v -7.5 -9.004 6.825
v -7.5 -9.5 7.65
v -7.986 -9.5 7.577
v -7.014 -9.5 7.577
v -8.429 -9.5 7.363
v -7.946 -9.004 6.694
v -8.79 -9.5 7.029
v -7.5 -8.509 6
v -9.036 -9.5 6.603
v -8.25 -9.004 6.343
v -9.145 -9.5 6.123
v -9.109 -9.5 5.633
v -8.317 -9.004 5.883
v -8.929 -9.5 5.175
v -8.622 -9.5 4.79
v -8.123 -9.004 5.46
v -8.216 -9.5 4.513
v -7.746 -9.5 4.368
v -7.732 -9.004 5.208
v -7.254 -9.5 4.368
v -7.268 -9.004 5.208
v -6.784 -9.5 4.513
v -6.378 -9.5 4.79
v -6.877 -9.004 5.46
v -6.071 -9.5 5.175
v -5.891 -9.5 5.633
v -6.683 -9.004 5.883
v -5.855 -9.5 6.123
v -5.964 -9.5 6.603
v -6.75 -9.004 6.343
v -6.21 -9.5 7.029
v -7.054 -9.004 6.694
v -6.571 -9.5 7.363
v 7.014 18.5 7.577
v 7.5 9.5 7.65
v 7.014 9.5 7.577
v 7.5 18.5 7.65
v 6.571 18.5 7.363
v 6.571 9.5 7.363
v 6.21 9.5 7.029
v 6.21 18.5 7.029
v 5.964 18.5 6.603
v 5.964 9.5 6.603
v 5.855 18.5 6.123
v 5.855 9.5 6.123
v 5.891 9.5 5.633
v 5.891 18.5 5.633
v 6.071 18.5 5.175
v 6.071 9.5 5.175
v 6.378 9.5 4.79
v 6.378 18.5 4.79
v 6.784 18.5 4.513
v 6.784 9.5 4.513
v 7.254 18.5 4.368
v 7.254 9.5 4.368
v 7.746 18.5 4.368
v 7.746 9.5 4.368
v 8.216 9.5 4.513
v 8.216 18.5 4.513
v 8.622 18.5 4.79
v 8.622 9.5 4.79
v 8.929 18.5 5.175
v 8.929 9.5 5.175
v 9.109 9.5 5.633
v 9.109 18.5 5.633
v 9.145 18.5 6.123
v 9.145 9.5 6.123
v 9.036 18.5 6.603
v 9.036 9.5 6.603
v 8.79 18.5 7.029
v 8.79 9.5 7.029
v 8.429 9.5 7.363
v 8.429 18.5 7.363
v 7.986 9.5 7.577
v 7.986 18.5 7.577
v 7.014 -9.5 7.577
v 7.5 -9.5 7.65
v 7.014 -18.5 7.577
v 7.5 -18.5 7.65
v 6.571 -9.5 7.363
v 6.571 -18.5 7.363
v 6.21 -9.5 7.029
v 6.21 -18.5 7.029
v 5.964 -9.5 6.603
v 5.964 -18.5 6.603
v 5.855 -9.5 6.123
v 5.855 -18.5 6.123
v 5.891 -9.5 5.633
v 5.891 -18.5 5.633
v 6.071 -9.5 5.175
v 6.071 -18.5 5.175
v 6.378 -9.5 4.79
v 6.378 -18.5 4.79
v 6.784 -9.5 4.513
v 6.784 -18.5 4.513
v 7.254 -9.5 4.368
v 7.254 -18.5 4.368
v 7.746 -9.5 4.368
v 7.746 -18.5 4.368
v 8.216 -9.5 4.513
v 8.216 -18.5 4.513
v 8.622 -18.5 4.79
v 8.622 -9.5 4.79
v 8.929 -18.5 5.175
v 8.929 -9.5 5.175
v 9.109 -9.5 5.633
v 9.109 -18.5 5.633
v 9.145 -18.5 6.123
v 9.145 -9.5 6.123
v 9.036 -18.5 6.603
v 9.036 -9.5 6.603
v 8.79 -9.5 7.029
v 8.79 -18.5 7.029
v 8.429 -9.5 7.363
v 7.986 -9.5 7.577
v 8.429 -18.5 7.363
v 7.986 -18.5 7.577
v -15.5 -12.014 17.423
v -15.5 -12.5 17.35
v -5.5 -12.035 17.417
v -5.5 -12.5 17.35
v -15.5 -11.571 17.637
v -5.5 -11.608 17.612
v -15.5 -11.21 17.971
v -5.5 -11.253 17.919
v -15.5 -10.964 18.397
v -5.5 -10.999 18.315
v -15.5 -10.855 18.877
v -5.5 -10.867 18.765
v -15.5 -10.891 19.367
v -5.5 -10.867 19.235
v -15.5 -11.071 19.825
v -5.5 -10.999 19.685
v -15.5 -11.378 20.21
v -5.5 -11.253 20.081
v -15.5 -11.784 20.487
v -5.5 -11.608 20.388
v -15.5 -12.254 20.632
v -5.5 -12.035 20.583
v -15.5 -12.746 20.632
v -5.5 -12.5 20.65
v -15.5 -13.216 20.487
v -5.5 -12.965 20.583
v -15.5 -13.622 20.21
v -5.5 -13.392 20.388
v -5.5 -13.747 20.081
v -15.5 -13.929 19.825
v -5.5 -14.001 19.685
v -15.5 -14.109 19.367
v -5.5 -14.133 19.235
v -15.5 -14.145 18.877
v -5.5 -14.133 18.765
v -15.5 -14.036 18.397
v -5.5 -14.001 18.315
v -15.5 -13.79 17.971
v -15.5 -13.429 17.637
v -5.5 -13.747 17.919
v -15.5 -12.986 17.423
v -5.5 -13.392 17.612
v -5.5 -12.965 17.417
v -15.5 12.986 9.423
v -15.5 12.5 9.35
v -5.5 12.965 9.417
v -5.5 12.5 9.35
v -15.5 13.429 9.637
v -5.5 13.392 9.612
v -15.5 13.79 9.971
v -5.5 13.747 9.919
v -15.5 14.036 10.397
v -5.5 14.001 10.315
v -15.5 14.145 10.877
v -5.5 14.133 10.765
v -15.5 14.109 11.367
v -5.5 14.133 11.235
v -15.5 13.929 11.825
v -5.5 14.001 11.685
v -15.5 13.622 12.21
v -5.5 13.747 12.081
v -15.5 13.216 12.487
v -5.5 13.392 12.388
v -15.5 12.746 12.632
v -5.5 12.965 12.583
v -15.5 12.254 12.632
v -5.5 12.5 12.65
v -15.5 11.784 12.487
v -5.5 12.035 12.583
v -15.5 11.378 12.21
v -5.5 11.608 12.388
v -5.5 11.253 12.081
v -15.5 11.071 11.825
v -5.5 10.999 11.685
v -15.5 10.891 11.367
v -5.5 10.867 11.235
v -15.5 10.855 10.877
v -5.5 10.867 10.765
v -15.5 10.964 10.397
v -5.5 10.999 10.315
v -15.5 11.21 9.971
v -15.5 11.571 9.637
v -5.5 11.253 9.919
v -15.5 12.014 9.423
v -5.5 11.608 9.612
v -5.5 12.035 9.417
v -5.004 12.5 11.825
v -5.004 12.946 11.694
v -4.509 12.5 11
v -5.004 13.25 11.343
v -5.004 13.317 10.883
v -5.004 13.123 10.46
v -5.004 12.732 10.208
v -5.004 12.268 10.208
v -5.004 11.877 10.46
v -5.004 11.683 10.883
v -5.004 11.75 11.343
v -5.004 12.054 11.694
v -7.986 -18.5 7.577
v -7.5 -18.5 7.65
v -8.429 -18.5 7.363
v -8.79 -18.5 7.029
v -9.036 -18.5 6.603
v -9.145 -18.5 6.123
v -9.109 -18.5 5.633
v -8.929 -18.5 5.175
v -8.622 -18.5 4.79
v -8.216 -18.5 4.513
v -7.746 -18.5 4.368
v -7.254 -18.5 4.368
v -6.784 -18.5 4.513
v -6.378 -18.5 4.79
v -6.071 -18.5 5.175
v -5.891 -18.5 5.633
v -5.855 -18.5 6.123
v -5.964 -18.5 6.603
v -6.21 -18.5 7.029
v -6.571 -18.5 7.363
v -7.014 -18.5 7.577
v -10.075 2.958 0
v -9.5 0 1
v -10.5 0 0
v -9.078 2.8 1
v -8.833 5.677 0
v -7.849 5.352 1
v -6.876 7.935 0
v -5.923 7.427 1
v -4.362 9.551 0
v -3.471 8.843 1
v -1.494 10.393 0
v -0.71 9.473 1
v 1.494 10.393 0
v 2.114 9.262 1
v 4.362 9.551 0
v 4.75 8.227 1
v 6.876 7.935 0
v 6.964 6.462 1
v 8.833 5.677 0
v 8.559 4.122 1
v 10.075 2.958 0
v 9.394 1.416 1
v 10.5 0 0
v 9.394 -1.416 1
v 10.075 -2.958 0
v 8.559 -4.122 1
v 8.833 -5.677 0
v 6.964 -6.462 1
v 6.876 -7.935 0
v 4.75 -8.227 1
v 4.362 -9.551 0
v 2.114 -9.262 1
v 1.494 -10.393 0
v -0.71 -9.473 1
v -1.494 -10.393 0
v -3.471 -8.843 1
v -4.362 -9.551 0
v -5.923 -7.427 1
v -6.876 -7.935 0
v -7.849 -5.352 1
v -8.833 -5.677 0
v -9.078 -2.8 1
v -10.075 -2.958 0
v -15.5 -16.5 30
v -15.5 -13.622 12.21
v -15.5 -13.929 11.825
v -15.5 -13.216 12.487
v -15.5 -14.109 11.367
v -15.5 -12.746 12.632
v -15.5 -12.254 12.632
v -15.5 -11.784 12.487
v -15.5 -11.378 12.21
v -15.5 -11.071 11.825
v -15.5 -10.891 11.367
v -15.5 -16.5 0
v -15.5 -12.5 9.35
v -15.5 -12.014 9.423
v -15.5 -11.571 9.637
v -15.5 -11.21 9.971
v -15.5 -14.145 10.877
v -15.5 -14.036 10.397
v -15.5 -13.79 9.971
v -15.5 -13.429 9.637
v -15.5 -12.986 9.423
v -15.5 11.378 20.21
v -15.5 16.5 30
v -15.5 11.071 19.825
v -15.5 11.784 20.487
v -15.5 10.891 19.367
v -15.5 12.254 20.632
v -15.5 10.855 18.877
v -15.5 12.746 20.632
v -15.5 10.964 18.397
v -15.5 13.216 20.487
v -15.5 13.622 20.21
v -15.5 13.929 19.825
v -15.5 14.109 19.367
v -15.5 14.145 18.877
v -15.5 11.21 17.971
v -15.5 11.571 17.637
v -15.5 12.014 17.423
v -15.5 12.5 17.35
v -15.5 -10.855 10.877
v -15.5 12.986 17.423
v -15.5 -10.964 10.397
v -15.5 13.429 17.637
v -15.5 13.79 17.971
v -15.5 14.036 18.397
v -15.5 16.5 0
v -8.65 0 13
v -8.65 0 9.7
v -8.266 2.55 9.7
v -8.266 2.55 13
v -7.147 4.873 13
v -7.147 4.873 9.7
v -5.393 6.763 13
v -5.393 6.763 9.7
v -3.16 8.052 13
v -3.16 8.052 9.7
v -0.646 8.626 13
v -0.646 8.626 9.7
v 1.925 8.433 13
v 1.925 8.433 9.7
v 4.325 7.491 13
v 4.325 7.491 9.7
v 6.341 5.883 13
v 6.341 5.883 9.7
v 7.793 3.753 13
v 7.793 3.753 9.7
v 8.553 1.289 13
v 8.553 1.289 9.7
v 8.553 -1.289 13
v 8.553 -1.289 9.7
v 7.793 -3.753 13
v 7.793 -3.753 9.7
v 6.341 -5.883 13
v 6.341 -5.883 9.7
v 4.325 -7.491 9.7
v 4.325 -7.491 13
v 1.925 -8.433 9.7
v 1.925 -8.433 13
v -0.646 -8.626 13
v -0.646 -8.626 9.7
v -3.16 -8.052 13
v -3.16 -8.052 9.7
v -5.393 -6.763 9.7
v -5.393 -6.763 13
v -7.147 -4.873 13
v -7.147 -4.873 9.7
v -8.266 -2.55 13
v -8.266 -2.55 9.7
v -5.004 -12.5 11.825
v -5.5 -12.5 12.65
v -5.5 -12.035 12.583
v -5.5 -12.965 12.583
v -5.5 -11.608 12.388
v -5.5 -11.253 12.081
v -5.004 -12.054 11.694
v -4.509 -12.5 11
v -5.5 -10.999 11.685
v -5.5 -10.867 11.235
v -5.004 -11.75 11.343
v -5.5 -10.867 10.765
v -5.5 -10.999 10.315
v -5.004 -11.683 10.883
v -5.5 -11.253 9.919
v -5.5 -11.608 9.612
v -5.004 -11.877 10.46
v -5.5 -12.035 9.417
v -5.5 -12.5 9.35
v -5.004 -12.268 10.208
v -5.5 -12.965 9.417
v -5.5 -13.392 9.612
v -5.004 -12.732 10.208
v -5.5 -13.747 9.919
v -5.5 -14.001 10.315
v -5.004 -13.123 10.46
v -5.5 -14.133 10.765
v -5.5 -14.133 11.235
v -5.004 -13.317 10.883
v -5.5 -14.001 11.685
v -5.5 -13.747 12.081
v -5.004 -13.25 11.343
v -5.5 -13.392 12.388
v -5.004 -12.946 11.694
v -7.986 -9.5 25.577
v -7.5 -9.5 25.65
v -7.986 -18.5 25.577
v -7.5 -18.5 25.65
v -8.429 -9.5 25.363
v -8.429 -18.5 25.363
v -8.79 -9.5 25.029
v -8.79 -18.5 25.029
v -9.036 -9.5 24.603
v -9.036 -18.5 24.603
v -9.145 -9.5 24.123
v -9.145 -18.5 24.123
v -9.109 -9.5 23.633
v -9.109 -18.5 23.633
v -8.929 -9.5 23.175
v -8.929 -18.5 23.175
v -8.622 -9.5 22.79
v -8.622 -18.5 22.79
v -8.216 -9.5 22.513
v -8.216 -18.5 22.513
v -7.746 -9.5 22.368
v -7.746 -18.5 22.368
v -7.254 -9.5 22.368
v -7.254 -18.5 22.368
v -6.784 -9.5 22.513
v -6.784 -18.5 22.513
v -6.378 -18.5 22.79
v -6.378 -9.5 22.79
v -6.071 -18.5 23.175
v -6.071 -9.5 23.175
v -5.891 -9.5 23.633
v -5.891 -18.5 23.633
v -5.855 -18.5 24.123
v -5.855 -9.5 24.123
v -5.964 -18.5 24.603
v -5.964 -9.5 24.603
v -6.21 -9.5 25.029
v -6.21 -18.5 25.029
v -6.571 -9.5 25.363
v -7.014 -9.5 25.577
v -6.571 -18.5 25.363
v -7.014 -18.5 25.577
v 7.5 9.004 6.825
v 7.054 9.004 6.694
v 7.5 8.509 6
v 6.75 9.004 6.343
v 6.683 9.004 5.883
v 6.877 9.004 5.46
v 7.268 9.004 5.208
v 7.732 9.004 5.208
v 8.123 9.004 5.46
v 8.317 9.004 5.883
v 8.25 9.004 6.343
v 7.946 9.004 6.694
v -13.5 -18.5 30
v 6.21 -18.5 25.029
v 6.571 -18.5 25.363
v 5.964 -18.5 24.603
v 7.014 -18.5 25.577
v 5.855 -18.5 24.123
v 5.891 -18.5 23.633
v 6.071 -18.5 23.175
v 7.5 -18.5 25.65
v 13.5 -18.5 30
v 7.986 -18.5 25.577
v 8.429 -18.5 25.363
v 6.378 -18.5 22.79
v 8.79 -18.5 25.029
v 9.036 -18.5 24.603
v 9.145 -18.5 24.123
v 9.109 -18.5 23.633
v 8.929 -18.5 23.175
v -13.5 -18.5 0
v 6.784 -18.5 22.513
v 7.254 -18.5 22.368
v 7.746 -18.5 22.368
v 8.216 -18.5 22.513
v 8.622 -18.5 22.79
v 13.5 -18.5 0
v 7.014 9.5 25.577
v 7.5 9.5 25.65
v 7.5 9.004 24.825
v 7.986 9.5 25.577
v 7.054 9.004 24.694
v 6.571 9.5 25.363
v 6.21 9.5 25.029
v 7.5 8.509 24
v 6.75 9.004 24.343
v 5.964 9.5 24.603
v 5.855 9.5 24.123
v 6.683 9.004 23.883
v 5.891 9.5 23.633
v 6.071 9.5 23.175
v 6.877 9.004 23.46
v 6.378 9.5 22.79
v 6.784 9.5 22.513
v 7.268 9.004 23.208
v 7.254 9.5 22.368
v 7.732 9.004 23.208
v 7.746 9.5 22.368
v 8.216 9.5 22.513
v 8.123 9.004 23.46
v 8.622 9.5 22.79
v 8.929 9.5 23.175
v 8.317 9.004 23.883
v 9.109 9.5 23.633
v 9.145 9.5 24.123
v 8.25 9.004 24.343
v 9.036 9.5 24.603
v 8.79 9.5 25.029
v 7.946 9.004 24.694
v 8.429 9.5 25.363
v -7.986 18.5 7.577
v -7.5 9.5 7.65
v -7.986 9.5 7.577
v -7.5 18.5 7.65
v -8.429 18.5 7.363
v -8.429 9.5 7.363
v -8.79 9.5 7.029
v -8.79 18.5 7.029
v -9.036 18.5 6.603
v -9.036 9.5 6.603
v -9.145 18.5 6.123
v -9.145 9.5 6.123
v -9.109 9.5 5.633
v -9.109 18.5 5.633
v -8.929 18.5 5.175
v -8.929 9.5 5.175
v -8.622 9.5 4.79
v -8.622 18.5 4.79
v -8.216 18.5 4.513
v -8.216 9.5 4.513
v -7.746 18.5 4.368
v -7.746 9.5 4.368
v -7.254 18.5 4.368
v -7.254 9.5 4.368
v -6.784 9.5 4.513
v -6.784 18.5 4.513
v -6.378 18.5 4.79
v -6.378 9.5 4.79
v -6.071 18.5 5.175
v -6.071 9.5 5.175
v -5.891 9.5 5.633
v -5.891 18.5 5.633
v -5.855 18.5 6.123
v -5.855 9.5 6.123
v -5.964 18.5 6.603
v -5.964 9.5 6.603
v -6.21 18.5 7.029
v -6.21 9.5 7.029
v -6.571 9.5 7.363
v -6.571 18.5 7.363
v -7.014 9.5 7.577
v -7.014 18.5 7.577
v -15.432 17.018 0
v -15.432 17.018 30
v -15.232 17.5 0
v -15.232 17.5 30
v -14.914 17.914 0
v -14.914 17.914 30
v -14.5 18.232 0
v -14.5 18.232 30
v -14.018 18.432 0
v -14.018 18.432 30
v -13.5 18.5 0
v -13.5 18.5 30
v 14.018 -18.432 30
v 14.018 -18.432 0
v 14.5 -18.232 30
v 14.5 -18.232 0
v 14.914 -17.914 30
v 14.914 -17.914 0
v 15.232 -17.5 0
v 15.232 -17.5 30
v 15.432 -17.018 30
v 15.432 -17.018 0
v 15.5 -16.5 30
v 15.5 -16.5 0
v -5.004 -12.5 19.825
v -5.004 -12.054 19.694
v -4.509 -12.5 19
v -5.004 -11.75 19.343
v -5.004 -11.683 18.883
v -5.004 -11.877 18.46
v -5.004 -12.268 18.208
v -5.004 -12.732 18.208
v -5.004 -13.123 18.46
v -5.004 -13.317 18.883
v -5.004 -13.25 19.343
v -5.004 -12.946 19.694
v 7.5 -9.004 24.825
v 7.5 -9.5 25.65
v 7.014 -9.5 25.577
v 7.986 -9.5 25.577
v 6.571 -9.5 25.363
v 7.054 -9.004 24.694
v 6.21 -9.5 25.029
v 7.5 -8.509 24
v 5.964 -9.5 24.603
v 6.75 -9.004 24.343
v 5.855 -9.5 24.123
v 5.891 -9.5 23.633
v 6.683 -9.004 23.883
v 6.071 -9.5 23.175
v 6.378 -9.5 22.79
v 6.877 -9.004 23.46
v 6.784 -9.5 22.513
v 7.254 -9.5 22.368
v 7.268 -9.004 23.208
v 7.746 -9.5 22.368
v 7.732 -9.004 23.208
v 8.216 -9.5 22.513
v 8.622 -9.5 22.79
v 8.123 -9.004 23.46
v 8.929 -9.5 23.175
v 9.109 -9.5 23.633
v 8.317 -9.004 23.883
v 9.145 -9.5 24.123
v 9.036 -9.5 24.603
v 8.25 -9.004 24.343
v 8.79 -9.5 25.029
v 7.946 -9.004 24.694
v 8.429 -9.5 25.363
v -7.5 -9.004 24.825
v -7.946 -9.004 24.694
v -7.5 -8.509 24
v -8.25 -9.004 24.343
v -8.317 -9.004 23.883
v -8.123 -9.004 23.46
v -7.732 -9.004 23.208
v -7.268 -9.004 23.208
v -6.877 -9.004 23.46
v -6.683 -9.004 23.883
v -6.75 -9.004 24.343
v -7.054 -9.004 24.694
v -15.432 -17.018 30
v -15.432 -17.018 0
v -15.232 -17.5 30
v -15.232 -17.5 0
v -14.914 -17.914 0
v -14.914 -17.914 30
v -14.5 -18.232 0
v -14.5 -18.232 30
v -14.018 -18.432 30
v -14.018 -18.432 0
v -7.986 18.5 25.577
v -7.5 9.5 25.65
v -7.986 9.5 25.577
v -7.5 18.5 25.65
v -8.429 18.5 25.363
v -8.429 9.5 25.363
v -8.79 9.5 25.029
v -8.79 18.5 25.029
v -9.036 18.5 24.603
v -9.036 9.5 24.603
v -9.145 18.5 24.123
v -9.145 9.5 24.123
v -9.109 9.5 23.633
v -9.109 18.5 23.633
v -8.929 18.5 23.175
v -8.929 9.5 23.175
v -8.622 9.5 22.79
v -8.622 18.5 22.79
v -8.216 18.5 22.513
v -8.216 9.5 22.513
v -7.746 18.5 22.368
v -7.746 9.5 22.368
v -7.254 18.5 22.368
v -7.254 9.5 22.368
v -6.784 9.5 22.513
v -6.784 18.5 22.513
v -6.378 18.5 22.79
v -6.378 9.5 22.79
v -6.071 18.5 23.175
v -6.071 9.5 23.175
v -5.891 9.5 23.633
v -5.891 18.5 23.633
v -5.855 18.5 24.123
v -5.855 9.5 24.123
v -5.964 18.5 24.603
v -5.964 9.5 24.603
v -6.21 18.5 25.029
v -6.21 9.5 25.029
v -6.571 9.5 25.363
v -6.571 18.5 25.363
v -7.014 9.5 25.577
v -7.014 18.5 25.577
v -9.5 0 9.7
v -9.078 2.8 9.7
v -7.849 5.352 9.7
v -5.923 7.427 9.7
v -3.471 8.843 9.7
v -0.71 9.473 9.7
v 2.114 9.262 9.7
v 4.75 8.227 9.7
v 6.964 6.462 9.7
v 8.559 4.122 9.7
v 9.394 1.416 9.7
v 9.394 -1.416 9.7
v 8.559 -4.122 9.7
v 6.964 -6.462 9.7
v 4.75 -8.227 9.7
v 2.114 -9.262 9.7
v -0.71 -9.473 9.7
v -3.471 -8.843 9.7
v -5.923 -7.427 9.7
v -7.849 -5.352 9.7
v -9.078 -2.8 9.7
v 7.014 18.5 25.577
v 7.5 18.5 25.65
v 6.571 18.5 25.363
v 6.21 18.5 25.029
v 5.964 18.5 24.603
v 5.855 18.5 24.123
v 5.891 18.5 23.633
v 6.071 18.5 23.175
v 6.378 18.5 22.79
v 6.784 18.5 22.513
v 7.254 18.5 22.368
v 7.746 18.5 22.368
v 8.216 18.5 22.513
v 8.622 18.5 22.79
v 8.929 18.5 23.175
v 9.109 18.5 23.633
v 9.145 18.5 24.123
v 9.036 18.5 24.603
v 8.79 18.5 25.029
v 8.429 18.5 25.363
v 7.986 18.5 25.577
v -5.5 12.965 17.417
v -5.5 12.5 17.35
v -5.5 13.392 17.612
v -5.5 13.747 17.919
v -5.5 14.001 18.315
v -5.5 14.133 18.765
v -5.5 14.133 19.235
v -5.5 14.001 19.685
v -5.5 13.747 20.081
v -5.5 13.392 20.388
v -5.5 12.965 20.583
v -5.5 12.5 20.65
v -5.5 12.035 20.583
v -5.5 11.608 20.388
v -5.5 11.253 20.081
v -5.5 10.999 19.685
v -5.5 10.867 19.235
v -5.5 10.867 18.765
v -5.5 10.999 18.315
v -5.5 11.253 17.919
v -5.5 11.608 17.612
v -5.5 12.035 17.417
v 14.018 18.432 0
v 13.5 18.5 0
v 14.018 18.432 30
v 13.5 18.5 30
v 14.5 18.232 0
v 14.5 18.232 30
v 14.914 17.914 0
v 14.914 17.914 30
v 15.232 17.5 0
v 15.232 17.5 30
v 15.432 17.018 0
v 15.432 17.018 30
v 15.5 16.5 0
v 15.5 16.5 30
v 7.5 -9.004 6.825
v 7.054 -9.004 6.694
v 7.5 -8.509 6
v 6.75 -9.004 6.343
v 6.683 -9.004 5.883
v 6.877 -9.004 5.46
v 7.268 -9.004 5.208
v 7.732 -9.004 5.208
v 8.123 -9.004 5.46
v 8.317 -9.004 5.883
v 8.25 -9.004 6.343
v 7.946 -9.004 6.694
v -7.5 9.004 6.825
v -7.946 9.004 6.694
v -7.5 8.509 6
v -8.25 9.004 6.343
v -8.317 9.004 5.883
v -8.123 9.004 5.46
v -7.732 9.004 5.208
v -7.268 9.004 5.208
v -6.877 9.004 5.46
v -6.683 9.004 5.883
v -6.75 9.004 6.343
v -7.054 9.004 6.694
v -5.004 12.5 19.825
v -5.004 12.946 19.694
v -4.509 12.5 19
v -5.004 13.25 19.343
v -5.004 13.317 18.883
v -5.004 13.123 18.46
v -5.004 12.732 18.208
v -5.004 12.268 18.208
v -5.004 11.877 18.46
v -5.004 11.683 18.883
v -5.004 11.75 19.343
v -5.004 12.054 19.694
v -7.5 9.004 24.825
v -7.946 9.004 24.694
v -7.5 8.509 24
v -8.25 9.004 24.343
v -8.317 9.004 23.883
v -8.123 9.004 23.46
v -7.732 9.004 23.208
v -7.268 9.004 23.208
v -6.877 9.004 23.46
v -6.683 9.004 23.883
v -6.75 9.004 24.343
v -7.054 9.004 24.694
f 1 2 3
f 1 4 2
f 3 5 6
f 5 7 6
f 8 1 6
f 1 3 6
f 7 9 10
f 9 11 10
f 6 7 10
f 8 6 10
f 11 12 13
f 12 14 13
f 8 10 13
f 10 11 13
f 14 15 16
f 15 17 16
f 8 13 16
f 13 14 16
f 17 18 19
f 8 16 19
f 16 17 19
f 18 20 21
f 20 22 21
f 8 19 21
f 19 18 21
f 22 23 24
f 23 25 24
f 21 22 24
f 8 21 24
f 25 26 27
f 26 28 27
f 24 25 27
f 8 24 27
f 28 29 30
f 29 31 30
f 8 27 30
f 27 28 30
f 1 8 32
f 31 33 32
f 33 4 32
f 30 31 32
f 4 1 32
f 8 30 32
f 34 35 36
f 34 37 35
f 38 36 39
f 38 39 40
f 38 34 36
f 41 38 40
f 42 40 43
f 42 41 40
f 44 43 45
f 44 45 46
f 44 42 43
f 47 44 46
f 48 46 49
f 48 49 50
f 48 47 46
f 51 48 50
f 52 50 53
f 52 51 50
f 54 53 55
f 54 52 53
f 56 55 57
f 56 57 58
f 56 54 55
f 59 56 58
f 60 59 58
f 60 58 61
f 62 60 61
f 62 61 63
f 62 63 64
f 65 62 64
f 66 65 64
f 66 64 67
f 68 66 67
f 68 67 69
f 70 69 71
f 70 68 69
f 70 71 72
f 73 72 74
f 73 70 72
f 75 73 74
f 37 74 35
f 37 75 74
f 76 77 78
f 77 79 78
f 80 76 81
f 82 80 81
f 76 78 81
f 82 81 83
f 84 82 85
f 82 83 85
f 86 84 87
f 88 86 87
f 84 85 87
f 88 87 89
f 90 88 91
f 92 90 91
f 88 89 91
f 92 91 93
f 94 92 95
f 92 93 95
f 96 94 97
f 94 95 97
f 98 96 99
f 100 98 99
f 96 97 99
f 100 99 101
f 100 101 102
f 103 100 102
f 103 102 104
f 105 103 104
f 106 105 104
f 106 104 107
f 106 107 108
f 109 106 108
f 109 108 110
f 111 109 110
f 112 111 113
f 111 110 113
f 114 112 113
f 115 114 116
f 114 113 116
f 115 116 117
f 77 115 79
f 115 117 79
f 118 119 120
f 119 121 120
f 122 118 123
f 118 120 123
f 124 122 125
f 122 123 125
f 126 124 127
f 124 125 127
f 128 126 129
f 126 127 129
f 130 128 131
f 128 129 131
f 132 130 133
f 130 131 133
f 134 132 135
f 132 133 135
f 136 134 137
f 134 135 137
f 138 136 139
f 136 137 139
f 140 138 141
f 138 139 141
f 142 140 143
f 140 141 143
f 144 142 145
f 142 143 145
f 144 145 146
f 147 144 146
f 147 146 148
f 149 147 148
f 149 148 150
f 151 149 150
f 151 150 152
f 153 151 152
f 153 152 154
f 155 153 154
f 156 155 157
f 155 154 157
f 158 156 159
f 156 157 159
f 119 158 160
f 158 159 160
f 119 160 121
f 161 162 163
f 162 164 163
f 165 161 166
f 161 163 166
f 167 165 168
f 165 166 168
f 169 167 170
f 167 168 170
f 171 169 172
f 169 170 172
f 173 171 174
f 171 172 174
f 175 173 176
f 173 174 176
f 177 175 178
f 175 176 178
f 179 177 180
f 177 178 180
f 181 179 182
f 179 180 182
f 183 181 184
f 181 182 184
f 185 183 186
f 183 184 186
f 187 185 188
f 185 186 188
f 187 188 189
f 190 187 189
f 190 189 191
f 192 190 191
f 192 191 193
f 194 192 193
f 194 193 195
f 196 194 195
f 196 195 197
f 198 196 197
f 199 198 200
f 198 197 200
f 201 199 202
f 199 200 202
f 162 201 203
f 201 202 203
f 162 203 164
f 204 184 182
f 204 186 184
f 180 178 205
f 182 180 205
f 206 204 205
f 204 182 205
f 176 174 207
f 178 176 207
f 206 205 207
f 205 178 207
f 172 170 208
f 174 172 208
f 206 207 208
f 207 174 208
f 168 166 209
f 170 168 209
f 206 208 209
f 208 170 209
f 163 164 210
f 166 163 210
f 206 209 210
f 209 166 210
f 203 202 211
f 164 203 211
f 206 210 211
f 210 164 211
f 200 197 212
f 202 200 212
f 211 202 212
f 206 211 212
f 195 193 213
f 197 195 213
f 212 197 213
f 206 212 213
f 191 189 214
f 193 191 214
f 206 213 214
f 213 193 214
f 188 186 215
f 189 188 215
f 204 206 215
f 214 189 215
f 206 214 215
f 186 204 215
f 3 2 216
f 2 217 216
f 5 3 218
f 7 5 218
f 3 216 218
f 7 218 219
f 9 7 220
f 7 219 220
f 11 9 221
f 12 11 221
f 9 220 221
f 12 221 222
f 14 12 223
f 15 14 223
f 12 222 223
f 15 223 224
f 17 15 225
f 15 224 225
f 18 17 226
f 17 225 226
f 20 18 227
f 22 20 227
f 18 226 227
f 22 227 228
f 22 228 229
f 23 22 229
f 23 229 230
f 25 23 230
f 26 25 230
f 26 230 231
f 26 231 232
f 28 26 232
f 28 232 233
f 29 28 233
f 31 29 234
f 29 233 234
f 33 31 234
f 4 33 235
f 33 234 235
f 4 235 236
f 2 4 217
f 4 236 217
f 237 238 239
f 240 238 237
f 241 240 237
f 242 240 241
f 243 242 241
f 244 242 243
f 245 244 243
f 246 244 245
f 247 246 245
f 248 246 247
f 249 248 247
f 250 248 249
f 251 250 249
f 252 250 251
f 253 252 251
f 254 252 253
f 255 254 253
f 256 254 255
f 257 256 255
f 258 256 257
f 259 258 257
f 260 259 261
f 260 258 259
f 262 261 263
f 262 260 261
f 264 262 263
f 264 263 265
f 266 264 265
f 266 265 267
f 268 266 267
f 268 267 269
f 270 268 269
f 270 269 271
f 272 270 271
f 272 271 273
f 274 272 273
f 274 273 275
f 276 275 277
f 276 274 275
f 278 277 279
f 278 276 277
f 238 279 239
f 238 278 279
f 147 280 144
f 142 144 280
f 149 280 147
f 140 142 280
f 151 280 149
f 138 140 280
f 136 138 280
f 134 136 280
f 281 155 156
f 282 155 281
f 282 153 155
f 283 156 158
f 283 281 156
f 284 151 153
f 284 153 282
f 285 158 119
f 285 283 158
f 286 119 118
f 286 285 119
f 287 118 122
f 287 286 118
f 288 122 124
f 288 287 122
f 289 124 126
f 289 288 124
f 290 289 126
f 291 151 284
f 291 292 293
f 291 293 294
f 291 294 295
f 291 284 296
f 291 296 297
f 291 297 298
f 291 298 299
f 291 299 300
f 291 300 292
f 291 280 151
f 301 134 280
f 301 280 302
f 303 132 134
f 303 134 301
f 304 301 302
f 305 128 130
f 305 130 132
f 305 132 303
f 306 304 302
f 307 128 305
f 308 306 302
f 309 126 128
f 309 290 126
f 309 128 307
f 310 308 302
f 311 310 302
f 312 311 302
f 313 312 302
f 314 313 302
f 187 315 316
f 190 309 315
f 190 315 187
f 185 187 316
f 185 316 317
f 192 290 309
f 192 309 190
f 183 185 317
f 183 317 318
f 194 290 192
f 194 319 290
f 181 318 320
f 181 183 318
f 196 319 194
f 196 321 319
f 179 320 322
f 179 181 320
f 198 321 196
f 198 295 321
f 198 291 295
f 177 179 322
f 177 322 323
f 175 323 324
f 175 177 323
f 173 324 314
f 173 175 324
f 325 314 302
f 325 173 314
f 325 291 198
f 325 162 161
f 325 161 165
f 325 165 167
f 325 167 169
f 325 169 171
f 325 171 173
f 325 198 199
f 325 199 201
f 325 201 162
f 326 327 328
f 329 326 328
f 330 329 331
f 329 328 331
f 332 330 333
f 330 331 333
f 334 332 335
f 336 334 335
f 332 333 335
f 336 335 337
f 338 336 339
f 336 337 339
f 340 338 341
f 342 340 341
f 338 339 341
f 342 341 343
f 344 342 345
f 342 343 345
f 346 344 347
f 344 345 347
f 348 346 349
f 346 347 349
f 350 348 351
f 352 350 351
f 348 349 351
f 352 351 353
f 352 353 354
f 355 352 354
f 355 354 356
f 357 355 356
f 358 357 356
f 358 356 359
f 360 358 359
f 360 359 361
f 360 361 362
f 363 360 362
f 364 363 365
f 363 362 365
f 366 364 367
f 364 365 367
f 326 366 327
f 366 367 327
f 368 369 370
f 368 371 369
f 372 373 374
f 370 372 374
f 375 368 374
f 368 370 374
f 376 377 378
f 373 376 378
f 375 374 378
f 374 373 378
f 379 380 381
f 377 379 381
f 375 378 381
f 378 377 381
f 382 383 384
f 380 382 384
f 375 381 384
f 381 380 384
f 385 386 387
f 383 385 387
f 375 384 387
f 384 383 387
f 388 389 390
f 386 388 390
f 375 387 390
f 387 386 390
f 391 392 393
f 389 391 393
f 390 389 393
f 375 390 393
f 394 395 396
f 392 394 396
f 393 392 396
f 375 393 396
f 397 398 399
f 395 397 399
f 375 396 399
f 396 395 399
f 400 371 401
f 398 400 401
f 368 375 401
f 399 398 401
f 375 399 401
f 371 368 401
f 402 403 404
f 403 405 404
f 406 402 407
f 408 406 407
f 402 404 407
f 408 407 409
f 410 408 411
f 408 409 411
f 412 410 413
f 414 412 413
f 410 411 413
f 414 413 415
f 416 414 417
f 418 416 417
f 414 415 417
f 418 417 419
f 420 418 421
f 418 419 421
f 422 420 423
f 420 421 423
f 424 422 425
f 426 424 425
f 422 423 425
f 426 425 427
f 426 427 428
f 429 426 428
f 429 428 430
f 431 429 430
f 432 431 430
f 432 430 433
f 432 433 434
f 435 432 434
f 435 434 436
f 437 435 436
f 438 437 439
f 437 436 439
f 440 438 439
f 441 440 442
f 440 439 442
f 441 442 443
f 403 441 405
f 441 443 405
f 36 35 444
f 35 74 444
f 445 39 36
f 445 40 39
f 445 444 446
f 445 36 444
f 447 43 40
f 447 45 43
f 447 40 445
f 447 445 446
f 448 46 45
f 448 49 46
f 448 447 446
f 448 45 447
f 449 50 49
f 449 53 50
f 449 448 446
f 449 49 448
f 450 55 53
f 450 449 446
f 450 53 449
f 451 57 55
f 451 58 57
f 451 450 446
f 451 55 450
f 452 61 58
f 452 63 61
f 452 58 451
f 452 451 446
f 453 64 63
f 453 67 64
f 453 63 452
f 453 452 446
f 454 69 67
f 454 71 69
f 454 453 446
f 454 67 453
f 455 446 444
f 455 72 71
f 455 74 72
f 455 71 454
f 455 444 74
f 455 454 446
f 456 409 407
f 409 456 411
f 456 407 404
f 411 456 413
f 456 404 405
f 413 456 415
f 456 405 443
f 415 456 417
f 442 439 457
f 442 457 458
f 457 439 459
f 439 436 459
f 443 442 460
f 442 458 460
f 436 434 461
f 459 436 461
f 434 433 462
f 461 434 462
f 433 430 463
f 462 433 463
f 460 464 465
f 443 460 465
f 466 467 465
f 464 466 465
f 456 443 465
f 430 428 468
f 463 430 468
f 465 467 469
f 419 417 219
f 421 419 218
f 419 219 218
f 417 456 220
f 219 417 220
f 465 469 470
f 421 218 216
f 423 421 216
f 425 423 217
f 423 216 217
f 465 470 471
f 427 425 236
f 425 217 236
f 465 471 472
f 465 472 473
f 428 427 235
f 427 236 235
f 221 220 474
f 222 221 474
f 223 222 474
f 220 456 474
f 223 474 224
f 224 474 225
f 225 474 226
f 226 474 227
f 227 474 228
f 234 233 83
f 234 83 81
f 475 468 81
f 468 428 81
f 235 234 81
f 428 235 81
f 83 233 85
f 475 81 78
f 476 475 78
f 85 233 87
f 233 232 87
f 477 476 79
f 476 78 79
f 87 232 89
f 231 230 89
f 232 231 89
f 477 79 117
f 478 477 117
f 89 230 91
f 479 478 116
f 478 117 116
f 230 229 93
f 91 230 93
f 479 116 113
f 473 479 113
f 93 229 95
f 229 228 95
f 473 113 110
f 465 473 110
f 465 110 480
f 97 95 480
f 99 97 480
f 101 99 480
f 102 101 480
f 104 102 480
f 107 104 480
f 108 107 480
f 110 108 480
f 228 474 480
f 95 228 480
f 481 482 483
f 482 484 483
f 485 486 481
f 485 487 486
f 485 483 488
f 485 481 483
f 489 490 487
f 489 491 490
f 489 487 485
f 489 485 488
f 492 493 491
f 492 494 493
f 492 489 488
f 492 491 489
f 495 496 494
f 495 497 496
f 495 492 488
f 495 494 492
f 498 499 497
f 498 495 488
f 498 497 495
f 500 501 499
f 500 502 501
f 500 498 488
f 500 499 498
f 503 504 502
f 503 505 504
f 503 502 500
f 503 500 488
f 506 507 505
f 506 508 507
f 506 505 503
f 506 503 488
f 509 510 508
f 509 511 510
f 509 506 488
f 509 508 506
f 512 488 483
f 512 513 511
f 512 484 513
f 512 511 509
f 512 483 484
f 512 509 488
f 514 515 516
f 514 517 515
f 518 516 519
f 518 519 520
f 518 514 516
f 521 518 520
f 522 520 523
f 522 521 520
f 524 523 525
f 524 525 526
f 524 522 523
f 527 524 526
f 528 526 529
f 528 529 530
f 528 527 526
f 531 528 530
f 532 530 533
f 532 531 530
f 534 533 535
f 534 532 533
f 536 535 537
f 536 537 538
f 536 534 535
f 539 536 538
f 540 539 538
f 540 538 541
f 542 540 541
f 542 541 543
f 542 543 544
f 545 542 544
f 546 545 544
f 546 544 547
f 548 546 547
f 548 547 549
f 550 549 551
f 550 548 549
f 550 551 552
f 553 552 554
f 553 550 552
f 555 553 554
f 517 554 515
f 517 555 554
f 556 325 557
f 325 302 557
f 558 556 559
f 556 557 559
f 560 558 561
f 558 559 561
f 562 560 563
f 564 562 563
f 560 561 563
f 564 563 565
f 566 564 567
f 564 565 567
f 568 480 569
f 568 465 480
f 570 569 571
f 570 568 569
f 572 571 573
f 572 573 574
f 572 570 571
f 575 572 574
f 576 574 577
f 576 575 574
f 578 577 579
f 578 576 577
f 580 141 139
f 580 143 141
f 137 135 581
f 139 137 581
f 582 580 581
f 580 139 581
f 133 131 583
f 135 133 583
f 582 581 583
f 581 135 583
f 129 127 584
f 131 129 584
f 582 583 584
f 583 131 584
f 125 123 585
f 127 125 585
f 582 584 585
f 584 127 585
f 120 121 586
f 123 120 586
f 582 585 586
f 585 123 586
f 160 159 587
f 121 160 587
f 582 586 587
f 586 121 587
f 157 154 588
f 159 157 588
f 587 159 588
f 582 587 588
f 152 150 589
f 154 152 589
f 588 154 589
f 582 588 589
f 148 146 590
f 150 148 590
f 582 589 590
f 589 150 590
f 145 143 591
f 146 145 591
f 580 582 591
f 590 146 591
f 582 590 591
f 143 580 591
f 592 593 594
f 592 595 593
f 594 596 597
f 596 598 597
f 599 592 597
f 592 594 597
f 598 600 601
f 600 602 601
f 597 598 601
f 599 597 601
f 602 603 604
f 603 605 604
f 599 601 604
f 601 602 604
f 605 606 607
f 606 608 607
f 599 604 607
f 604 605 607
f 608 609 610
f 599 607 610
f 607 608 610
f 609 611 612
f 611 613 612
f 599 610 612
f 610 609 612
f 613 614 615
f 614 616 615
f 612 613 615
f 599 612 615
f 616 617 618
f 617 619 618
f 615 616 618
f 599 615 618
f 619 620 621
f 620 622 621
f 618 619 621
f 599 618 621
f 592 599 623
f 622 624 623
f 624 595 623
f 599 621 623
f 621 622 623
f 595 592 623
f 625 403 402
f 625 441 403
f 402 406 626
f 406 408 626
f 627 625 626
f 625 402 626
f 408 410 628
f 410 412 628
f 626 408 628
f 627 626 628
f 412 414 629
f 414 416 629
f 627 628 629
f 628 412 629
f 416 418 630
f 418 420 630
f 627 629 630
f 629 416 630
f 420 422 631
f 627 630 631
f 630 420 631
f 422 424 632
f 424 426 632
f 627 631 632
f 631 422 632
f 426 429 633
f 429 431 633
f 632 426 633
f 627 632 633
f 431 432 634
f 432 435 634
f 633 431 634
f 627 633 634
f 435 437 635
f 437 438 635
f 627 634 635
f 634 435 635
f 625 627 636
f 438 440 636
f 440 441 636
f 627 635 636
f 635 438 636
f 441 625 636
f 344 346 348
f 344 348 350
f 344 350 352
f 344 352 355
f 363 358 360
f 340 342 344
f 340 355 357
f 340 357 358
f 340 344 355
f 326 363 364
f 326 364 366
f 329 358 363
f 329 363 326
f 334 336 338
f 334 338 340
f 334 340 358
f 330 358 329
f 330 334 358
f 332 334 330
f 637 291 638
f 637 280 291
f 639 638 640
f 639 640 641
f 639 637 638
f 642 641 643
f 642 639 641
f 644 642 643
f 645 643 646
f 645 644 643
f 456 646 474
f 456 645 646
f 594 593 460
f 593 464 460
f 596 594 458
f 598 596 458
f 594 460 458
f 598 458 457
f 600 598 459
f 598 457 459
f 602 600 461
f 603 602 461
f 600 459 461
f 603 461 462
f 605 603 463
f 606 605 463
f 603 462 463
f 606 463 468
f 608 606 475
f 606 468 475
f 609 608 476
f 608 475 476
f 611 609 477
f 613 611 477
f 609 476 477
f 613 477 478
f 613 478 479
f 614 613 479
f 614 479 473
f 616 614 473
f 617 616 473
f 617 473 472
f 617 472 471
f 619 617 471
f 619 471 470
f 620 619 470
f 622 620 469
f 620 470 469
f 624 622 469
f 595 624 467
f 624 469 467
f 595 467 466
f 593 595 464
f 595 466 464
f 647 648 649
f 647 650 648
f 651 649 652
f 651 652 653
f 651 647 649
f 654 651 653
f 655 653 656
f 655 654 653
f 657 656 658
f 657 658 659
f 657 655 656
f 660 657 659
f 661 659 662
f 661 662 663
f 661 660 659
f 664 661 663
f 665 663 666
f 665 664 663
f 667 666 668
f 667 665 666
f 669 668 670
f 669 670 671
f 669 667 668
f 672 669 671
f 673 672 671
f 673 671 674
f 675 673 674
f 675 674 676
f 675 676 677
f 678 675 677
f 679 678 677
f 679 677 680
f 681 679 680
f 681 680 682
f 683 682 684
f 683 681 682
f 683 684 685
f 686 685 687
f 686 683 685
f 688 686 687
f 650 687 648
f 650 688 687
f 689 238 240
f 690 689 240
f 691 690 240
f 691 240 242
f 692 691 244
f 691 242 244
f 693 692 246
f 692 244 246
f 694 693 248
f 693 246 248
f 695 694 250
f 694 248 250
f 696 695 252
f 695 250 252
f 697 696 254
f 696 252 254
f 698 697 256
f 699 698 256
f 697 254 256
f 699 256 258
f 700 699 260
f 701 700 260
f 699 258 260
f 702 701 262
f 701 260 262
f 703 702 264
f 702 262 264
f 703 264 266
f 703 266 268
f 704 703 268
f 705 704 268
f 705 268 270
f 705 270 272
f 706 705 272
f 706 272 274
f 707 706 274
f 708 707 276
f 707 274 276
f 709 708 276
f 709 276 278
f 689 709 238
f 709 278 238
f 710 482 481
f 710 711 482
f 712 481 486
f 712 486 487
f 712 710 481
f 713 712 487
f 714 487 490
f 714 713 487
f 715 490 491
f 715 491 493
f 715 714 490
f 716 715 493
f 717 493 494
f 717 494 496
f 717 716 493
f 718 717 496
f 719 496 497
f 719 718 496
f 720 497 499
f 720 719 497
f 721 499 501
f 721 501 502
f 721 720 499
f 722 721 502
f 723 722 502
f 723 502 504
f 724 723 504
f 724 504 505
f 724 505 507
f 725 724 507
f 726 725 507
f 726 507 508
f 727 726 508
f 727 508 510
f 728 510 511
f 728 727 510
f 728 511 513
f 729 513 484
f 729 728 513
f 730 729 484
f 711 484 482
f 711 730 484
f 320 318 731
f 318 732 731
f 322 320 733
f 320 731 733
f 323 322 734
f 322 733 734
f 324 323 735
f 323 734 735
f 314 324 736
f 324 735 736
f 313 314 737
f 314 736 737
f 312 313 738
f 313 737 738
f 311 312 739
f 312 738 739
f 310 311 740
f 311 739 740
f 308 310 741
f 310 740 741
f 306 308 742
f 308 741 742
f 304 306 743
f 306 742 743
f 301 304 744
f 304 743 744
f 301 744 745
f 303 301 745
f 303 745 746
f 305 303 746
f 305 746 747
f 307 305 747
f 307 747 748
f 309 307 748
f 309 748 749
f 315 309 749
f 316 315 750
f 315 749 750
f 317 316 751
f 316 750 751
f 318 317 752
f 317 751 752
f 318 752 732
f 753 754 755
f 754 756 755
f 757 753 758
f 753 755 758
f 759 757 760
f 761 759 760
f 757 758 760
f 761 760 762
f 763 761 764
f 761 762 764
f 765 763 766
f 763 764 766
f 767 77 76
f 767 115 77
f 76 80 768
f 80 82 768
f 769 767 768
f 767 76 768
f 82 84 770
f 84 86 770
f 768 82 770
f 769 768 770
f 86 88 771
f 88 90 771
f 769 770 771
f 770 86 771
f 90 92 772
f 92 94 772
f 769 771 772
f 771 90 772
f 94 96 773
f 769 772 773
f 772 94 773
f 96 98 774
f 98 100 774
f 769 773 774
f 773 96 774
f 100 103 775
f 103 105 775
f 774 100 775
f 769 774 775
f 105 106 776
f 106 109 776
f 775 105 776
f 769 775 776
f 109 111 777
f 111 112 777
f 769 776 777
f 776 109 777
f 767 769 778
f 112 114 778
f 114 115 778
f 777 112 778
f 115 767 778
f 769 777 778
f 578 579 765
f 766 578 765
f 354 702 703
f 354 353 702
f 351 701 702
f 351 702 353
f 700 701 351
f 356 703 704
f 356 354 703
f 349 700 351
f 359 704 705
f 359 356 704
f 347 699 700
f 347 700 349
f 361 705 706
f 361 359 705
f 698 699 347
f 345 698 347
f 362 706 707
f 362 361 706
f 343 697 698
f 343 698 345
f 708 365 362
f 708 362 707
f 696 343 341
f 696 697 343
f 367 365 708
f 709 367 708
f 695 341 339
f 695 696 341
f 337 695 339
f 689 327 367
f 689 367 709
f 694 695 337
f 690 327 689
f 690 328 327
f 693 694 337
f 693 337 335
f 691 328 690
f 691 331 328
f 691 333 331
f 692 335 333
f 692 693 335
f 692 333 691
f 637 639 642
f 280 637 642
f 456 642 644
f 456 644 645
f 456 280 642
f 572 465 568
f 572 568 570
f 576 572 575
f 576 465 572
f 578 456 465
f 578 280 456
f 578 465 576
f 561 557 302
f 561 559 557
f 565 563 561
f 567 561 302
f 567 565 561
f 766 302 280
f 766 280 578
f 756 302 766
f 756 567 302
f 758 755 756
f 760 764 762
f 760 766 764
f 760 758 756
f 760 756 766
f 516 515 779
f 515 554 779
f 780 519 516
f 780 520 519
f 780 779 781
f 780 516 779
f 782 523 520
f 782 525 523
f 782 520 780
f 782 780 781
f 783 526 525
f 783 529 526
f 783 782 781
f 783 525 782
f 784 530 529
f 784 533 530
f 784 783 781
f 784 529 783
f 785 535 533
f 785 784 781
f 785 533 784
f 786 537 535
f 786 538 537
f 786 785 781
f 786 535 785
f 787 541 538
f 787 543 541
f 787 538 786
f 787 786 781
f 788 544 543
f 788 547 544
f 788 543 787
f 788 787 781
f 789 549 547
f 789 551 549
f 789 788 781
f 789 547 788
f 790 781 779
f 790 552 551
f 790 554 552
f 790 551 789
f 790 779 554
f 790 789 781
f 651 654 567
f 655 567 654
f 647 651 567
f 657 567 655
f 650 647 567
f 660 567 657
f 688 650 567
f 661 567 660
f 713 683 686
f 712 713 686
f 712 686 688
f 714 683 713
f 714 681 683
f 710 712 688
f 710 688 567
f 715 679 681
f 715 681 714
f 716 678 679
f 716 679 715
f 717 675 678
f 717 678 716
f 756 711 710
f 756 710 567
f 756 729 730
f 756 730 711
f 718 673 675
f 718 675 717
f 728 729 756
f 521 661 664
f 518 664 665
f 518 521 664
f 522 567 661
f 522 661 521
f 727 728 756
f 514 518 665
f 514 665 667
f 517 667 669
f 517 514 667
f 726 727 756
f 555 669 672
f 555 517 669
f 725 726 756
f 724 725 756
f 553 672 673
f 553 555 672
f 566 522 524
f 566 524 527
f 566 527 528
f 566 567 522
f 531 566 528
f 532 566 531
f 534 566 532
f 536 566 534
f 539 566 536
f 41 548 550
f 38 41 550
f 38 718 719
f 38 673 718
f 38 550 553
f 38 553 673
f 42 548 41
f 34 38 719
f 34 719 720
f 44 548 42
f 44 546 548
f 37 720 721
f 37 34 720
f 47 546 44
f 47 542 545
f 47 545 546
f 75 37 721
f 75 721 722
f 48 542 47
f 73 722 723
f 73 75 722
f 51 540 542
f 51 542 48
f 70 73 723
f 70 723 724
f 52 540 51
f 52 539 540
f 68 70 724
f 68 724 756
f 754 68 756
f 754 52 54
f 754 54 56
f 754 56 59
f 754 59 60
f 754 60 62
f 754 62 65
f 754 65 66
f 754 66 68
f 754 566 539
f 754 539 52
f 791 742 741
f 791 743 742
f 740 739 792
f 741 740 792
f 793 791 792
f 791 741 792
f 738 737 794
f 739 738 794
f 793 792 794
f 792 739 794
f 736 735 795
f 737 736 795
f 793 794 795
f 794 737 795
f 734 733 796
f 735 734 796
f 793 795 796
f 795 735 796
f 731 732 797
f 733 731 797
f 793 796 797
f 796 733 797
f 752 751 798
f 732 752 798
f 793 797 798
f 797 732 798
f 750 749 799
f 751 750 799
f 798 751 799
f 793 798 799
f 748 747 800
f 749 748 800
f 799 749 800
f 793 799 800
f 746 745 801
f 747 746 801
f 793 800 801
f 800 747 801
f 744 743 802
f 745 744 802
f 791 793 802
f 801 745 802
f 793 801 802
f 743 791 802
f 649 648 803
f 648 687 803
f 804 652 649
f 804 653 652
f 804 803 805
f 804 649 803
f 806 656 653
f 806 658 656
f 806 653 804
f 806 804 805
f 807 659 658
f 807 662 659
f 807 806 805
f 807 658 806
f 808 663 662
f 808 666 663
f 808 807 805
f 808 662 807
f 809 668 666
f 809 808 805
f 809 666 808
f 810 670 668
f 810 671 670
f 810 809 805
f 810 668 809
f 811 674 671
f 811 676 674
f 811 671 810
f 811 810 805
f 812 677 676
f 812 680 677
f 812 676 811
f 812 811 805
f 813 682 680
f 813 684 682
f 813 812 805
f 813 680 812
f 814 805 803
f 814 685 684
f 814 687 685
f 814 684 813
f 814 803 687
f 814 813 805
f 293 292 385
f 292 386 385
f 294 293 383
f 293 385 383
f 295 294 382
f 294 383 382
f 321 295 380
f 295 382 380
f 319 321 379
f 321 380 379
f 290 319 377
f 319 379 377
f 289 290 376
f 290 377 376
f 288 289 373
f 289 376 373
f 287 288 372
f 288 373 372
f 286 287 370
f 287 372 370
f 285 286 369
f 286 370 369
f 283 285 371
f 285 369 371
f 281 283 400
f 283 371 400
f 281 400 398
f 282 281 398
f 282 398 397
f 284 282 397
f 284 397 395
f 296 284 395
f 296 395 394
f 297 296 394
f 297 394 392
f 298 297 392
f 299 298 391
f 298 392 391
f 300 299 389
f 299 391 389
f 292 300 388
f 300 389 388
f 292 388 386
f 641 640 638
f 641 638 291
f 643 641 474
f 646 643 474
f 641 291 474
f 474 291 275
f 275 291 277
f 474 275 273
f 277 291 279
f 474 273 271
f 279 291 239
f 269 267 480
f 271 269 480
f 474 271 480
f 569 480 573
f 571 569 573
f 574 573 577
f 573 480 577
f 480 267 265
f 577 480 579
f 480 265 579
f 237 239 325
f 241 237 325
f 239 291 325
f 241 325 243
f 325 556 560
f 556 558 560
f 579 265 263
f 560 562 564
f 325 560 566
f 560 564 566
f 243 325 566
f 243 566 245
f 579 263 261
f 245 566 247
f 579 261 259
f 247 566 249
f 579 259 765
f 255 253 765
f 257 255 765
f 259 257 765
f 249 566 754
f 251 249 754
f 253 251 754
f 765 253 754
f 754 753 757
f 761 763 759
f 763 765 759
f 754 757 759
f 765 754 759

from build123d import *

# Parameters (mm, degrees)
SKETCH_1_W                  = 31
SKETCH_1_H                  = 37
EXTRUDE_1_DEPTH             = 30
HOLE_WIZARD_M4_1_AT_2_COUNT = 2
HOLE_WIZARD_M4_1_AT_2_PITCH = 15
HOLE_WIZARD_M4_1_AT_3_COUNT = 2
HOLE_WIZARD_M4_1_AT_3_PITCH = 23.430749028
HOLE_WIZARD_M4_1_AT_4_COUNT = 2
HOLE_WIZARD_M4_1_AT_4_PITCH = 18
HOLE_WIZARD_M4_2_D          = 3.3
HOLE_WIZARD_M4_2_DEPTH      = 10
HOLE_WIZARD_M4_2_TIP        = 0.991420021
SKETCH_8_R                  = 9.5
CUT_EXTRUDE_1_DEPTH         = 9.7
SKETCH_9_R                  = 8.65
CUT_EXTRUDE_2_DEPTH         = 3.3
FILLET_1_R                  = 2
CHAMFER_1_SIZE              = 1


with BuildPart() as part:
    # 草图1 → 凸台-拉伸1 (new body)
    with BuildSketch(Plane.XY):
        Rectangle(SKETCH_1_W, SKETCH_1_H)
    extrude(amount=EXTRUDE_1_DEPTH)

    # 草图4 → M4 螺纹孔1 (revolve, cut)
    with BuildSketch(Plane(origin=(-7.5, 18.5, 6), x_dir=(0, 0, 1), z_dir=(1, 0, 0))):
        Polygon((0, 0), (0, 9.991420021), (1.65, 9), (1.65, 0), align=None)
    hole_wizard_m4_1 = revolve(axis=Axis((-7.5, 24.85, 6), (0, -1, 0)), mode=Mode.SUBTRACT)

    # M4 螺纹孔1 at 2: M4 螺纹孔1 ×2
    with Locations(*[(i * HOLE_WIZARD_M4_1_AT_2_PITCH, 0, 0) for i in range(1, HOLE_WIZARD_M4_1_AT_2_COUNT)]):
        add(hole_wizard_m4_1, mode=Mode.SUBTRACT)

    # M4 螺纹孔1 at 3: M4 螺纹孔1 ×2
    with Locations(*[Vector(0.6401843996644799, 0, 0.7682212795973757) * (i * HOLE_WIZARD_M4_1_AT_3_PITCH) for i in range(1, HOLE_WIZARD_M4_1_AT_3_COUNT)]):
        add(hole_wizard_m4_1, mode=Mode.SUBTRACT)

    # M4 螺纹孔1 at 4: M4 螺纹孔1 ×2
    with Locations(*[(0, 0, i * HOLE_WIZARD_M4_1_AT_4_PITCH) for i in range(1, HOLE_WIZARD_M4_1_AT_4_COUNT)]):
        add(hole_wizard_m4_1, mode=Mode.SUBTRACT)

    # 镜向1: M4 螺纹孔1 across plane
    add(hole_wizard_m4_1.mirror(Plane.ZX), mode=Mode.SUBTRACT)

    # 镜向1 copy 1 sketch → 镜向1 copy 1 (revolve, cut)
    with BuildSketch(Plane(origin=(7.5, -18.5, 6), x_dir=(0, 0, 1), z_dir=(1, 0, 0))):
        Polygon((0, 0), (0, -9.991420021), (1.65, -9), (1.65, 0), align=None)
    revolve(axis=Axis((7.5, -24.85, 6), (0, -1, 0)), mode=Mode.SUBTRACT)

    # 镜向1 copy 2 sketch → 镜向1 copy 2 (revolve, cut)
    with BuildSketch(Plane(origin=(7.5, -18.5, 24), x_dir=(0, 0, 1), z_dir=(1, 0, 0))):
        Polygon((0, 0), (0, -9.991420021), (1.65, -9), (1.65, 0), align=None)
    revolve(axis=Axis((7.5, -24.85, 24), (0, -1, 0)), mode=Mode.SUBTRACT)

    # 镜向1 copy 3 sketch → 镜向1 copy 3 (revolve, cut)
    with BuildSketch(Plane(origin=(-7.5, -18.5, 24), x_dir=(0, 0, 1), z_dir=(1, 0, 0))):
        Polygon((0, 0), (0, -9.991420021), (1.65, -9), (1.65, 0), align=None)
    revolve(axis=Axis((-7.5, -24.85, 24), (0, -1, 0)), mode=Mode.SUBTRACT)

    # M4 螺纹孔2
    with Locations(Plane.ZY.offset(15.5)):
        with Locations((11, 12.5), (19, 12.5), (19, -12.5), (11, -12.5)):
            Hole(HOLE_WIZARD_M4_2_D / 2, depth=HOLE_WIZARD_M4_2_DEPTH)
            with Locations((0, 0, -(HOLE_WIZARD_M4_2_DEPTH + HOLE_WIZARD_M4_2_TIP / 2))):  # 118° drill point
                Cone(0, HOLE_WIZARD_M4_2_D / 2, HOLE_WIZARD_M4_2_TIP, mode=Mode.SUBTRACT)

    # 草图8 → 切除-拉伸1 (cut)
    with BuildSketch(Plane(origin=(0, 0, 0), x_dir=(-1, 0, 0), z_dir=(0, 0, -1))):
        Circle(SKETCH_8_R)
    extrude(amount=-CUT_EXTRUDE_1_DEPTH, mode=Mode.SUBTRACT)

    # 草图9 → 切除-拉伸2 (cut)
    with BuildSketch(Plane(origin=(0, 0, 9.7), x_dir=(-1, 0, 0), z_dir=(0, 0, -1))):
        Circle(SKETCH_9_R)
    extrude(amount=-CUT_EXTRUDE_2_DEPTH, mode=Mode.SUBTRACT)

    # 圆角1
    fillet_1_edges = [part.edges().sort_by_distance(p)[0] for p in [
        (15.5, -18.5, 15),
        (-15.5, -18.5, 15),
        (-15.5, 18.5, 15),
        (15.5, 18.5, 15),
    ]]
    fillet(fillet_1_edges, radius=FILLET_1_R)

    # 倒角1
    chamfer_1_edges = [part.edges().sort_by_distance(p)[0] for p in [
        (9.5, 0, 0),
    ]]
    chamfer(chamfer_1_edges, length=CHAMFER_1_SIZE)


solid = part.part
